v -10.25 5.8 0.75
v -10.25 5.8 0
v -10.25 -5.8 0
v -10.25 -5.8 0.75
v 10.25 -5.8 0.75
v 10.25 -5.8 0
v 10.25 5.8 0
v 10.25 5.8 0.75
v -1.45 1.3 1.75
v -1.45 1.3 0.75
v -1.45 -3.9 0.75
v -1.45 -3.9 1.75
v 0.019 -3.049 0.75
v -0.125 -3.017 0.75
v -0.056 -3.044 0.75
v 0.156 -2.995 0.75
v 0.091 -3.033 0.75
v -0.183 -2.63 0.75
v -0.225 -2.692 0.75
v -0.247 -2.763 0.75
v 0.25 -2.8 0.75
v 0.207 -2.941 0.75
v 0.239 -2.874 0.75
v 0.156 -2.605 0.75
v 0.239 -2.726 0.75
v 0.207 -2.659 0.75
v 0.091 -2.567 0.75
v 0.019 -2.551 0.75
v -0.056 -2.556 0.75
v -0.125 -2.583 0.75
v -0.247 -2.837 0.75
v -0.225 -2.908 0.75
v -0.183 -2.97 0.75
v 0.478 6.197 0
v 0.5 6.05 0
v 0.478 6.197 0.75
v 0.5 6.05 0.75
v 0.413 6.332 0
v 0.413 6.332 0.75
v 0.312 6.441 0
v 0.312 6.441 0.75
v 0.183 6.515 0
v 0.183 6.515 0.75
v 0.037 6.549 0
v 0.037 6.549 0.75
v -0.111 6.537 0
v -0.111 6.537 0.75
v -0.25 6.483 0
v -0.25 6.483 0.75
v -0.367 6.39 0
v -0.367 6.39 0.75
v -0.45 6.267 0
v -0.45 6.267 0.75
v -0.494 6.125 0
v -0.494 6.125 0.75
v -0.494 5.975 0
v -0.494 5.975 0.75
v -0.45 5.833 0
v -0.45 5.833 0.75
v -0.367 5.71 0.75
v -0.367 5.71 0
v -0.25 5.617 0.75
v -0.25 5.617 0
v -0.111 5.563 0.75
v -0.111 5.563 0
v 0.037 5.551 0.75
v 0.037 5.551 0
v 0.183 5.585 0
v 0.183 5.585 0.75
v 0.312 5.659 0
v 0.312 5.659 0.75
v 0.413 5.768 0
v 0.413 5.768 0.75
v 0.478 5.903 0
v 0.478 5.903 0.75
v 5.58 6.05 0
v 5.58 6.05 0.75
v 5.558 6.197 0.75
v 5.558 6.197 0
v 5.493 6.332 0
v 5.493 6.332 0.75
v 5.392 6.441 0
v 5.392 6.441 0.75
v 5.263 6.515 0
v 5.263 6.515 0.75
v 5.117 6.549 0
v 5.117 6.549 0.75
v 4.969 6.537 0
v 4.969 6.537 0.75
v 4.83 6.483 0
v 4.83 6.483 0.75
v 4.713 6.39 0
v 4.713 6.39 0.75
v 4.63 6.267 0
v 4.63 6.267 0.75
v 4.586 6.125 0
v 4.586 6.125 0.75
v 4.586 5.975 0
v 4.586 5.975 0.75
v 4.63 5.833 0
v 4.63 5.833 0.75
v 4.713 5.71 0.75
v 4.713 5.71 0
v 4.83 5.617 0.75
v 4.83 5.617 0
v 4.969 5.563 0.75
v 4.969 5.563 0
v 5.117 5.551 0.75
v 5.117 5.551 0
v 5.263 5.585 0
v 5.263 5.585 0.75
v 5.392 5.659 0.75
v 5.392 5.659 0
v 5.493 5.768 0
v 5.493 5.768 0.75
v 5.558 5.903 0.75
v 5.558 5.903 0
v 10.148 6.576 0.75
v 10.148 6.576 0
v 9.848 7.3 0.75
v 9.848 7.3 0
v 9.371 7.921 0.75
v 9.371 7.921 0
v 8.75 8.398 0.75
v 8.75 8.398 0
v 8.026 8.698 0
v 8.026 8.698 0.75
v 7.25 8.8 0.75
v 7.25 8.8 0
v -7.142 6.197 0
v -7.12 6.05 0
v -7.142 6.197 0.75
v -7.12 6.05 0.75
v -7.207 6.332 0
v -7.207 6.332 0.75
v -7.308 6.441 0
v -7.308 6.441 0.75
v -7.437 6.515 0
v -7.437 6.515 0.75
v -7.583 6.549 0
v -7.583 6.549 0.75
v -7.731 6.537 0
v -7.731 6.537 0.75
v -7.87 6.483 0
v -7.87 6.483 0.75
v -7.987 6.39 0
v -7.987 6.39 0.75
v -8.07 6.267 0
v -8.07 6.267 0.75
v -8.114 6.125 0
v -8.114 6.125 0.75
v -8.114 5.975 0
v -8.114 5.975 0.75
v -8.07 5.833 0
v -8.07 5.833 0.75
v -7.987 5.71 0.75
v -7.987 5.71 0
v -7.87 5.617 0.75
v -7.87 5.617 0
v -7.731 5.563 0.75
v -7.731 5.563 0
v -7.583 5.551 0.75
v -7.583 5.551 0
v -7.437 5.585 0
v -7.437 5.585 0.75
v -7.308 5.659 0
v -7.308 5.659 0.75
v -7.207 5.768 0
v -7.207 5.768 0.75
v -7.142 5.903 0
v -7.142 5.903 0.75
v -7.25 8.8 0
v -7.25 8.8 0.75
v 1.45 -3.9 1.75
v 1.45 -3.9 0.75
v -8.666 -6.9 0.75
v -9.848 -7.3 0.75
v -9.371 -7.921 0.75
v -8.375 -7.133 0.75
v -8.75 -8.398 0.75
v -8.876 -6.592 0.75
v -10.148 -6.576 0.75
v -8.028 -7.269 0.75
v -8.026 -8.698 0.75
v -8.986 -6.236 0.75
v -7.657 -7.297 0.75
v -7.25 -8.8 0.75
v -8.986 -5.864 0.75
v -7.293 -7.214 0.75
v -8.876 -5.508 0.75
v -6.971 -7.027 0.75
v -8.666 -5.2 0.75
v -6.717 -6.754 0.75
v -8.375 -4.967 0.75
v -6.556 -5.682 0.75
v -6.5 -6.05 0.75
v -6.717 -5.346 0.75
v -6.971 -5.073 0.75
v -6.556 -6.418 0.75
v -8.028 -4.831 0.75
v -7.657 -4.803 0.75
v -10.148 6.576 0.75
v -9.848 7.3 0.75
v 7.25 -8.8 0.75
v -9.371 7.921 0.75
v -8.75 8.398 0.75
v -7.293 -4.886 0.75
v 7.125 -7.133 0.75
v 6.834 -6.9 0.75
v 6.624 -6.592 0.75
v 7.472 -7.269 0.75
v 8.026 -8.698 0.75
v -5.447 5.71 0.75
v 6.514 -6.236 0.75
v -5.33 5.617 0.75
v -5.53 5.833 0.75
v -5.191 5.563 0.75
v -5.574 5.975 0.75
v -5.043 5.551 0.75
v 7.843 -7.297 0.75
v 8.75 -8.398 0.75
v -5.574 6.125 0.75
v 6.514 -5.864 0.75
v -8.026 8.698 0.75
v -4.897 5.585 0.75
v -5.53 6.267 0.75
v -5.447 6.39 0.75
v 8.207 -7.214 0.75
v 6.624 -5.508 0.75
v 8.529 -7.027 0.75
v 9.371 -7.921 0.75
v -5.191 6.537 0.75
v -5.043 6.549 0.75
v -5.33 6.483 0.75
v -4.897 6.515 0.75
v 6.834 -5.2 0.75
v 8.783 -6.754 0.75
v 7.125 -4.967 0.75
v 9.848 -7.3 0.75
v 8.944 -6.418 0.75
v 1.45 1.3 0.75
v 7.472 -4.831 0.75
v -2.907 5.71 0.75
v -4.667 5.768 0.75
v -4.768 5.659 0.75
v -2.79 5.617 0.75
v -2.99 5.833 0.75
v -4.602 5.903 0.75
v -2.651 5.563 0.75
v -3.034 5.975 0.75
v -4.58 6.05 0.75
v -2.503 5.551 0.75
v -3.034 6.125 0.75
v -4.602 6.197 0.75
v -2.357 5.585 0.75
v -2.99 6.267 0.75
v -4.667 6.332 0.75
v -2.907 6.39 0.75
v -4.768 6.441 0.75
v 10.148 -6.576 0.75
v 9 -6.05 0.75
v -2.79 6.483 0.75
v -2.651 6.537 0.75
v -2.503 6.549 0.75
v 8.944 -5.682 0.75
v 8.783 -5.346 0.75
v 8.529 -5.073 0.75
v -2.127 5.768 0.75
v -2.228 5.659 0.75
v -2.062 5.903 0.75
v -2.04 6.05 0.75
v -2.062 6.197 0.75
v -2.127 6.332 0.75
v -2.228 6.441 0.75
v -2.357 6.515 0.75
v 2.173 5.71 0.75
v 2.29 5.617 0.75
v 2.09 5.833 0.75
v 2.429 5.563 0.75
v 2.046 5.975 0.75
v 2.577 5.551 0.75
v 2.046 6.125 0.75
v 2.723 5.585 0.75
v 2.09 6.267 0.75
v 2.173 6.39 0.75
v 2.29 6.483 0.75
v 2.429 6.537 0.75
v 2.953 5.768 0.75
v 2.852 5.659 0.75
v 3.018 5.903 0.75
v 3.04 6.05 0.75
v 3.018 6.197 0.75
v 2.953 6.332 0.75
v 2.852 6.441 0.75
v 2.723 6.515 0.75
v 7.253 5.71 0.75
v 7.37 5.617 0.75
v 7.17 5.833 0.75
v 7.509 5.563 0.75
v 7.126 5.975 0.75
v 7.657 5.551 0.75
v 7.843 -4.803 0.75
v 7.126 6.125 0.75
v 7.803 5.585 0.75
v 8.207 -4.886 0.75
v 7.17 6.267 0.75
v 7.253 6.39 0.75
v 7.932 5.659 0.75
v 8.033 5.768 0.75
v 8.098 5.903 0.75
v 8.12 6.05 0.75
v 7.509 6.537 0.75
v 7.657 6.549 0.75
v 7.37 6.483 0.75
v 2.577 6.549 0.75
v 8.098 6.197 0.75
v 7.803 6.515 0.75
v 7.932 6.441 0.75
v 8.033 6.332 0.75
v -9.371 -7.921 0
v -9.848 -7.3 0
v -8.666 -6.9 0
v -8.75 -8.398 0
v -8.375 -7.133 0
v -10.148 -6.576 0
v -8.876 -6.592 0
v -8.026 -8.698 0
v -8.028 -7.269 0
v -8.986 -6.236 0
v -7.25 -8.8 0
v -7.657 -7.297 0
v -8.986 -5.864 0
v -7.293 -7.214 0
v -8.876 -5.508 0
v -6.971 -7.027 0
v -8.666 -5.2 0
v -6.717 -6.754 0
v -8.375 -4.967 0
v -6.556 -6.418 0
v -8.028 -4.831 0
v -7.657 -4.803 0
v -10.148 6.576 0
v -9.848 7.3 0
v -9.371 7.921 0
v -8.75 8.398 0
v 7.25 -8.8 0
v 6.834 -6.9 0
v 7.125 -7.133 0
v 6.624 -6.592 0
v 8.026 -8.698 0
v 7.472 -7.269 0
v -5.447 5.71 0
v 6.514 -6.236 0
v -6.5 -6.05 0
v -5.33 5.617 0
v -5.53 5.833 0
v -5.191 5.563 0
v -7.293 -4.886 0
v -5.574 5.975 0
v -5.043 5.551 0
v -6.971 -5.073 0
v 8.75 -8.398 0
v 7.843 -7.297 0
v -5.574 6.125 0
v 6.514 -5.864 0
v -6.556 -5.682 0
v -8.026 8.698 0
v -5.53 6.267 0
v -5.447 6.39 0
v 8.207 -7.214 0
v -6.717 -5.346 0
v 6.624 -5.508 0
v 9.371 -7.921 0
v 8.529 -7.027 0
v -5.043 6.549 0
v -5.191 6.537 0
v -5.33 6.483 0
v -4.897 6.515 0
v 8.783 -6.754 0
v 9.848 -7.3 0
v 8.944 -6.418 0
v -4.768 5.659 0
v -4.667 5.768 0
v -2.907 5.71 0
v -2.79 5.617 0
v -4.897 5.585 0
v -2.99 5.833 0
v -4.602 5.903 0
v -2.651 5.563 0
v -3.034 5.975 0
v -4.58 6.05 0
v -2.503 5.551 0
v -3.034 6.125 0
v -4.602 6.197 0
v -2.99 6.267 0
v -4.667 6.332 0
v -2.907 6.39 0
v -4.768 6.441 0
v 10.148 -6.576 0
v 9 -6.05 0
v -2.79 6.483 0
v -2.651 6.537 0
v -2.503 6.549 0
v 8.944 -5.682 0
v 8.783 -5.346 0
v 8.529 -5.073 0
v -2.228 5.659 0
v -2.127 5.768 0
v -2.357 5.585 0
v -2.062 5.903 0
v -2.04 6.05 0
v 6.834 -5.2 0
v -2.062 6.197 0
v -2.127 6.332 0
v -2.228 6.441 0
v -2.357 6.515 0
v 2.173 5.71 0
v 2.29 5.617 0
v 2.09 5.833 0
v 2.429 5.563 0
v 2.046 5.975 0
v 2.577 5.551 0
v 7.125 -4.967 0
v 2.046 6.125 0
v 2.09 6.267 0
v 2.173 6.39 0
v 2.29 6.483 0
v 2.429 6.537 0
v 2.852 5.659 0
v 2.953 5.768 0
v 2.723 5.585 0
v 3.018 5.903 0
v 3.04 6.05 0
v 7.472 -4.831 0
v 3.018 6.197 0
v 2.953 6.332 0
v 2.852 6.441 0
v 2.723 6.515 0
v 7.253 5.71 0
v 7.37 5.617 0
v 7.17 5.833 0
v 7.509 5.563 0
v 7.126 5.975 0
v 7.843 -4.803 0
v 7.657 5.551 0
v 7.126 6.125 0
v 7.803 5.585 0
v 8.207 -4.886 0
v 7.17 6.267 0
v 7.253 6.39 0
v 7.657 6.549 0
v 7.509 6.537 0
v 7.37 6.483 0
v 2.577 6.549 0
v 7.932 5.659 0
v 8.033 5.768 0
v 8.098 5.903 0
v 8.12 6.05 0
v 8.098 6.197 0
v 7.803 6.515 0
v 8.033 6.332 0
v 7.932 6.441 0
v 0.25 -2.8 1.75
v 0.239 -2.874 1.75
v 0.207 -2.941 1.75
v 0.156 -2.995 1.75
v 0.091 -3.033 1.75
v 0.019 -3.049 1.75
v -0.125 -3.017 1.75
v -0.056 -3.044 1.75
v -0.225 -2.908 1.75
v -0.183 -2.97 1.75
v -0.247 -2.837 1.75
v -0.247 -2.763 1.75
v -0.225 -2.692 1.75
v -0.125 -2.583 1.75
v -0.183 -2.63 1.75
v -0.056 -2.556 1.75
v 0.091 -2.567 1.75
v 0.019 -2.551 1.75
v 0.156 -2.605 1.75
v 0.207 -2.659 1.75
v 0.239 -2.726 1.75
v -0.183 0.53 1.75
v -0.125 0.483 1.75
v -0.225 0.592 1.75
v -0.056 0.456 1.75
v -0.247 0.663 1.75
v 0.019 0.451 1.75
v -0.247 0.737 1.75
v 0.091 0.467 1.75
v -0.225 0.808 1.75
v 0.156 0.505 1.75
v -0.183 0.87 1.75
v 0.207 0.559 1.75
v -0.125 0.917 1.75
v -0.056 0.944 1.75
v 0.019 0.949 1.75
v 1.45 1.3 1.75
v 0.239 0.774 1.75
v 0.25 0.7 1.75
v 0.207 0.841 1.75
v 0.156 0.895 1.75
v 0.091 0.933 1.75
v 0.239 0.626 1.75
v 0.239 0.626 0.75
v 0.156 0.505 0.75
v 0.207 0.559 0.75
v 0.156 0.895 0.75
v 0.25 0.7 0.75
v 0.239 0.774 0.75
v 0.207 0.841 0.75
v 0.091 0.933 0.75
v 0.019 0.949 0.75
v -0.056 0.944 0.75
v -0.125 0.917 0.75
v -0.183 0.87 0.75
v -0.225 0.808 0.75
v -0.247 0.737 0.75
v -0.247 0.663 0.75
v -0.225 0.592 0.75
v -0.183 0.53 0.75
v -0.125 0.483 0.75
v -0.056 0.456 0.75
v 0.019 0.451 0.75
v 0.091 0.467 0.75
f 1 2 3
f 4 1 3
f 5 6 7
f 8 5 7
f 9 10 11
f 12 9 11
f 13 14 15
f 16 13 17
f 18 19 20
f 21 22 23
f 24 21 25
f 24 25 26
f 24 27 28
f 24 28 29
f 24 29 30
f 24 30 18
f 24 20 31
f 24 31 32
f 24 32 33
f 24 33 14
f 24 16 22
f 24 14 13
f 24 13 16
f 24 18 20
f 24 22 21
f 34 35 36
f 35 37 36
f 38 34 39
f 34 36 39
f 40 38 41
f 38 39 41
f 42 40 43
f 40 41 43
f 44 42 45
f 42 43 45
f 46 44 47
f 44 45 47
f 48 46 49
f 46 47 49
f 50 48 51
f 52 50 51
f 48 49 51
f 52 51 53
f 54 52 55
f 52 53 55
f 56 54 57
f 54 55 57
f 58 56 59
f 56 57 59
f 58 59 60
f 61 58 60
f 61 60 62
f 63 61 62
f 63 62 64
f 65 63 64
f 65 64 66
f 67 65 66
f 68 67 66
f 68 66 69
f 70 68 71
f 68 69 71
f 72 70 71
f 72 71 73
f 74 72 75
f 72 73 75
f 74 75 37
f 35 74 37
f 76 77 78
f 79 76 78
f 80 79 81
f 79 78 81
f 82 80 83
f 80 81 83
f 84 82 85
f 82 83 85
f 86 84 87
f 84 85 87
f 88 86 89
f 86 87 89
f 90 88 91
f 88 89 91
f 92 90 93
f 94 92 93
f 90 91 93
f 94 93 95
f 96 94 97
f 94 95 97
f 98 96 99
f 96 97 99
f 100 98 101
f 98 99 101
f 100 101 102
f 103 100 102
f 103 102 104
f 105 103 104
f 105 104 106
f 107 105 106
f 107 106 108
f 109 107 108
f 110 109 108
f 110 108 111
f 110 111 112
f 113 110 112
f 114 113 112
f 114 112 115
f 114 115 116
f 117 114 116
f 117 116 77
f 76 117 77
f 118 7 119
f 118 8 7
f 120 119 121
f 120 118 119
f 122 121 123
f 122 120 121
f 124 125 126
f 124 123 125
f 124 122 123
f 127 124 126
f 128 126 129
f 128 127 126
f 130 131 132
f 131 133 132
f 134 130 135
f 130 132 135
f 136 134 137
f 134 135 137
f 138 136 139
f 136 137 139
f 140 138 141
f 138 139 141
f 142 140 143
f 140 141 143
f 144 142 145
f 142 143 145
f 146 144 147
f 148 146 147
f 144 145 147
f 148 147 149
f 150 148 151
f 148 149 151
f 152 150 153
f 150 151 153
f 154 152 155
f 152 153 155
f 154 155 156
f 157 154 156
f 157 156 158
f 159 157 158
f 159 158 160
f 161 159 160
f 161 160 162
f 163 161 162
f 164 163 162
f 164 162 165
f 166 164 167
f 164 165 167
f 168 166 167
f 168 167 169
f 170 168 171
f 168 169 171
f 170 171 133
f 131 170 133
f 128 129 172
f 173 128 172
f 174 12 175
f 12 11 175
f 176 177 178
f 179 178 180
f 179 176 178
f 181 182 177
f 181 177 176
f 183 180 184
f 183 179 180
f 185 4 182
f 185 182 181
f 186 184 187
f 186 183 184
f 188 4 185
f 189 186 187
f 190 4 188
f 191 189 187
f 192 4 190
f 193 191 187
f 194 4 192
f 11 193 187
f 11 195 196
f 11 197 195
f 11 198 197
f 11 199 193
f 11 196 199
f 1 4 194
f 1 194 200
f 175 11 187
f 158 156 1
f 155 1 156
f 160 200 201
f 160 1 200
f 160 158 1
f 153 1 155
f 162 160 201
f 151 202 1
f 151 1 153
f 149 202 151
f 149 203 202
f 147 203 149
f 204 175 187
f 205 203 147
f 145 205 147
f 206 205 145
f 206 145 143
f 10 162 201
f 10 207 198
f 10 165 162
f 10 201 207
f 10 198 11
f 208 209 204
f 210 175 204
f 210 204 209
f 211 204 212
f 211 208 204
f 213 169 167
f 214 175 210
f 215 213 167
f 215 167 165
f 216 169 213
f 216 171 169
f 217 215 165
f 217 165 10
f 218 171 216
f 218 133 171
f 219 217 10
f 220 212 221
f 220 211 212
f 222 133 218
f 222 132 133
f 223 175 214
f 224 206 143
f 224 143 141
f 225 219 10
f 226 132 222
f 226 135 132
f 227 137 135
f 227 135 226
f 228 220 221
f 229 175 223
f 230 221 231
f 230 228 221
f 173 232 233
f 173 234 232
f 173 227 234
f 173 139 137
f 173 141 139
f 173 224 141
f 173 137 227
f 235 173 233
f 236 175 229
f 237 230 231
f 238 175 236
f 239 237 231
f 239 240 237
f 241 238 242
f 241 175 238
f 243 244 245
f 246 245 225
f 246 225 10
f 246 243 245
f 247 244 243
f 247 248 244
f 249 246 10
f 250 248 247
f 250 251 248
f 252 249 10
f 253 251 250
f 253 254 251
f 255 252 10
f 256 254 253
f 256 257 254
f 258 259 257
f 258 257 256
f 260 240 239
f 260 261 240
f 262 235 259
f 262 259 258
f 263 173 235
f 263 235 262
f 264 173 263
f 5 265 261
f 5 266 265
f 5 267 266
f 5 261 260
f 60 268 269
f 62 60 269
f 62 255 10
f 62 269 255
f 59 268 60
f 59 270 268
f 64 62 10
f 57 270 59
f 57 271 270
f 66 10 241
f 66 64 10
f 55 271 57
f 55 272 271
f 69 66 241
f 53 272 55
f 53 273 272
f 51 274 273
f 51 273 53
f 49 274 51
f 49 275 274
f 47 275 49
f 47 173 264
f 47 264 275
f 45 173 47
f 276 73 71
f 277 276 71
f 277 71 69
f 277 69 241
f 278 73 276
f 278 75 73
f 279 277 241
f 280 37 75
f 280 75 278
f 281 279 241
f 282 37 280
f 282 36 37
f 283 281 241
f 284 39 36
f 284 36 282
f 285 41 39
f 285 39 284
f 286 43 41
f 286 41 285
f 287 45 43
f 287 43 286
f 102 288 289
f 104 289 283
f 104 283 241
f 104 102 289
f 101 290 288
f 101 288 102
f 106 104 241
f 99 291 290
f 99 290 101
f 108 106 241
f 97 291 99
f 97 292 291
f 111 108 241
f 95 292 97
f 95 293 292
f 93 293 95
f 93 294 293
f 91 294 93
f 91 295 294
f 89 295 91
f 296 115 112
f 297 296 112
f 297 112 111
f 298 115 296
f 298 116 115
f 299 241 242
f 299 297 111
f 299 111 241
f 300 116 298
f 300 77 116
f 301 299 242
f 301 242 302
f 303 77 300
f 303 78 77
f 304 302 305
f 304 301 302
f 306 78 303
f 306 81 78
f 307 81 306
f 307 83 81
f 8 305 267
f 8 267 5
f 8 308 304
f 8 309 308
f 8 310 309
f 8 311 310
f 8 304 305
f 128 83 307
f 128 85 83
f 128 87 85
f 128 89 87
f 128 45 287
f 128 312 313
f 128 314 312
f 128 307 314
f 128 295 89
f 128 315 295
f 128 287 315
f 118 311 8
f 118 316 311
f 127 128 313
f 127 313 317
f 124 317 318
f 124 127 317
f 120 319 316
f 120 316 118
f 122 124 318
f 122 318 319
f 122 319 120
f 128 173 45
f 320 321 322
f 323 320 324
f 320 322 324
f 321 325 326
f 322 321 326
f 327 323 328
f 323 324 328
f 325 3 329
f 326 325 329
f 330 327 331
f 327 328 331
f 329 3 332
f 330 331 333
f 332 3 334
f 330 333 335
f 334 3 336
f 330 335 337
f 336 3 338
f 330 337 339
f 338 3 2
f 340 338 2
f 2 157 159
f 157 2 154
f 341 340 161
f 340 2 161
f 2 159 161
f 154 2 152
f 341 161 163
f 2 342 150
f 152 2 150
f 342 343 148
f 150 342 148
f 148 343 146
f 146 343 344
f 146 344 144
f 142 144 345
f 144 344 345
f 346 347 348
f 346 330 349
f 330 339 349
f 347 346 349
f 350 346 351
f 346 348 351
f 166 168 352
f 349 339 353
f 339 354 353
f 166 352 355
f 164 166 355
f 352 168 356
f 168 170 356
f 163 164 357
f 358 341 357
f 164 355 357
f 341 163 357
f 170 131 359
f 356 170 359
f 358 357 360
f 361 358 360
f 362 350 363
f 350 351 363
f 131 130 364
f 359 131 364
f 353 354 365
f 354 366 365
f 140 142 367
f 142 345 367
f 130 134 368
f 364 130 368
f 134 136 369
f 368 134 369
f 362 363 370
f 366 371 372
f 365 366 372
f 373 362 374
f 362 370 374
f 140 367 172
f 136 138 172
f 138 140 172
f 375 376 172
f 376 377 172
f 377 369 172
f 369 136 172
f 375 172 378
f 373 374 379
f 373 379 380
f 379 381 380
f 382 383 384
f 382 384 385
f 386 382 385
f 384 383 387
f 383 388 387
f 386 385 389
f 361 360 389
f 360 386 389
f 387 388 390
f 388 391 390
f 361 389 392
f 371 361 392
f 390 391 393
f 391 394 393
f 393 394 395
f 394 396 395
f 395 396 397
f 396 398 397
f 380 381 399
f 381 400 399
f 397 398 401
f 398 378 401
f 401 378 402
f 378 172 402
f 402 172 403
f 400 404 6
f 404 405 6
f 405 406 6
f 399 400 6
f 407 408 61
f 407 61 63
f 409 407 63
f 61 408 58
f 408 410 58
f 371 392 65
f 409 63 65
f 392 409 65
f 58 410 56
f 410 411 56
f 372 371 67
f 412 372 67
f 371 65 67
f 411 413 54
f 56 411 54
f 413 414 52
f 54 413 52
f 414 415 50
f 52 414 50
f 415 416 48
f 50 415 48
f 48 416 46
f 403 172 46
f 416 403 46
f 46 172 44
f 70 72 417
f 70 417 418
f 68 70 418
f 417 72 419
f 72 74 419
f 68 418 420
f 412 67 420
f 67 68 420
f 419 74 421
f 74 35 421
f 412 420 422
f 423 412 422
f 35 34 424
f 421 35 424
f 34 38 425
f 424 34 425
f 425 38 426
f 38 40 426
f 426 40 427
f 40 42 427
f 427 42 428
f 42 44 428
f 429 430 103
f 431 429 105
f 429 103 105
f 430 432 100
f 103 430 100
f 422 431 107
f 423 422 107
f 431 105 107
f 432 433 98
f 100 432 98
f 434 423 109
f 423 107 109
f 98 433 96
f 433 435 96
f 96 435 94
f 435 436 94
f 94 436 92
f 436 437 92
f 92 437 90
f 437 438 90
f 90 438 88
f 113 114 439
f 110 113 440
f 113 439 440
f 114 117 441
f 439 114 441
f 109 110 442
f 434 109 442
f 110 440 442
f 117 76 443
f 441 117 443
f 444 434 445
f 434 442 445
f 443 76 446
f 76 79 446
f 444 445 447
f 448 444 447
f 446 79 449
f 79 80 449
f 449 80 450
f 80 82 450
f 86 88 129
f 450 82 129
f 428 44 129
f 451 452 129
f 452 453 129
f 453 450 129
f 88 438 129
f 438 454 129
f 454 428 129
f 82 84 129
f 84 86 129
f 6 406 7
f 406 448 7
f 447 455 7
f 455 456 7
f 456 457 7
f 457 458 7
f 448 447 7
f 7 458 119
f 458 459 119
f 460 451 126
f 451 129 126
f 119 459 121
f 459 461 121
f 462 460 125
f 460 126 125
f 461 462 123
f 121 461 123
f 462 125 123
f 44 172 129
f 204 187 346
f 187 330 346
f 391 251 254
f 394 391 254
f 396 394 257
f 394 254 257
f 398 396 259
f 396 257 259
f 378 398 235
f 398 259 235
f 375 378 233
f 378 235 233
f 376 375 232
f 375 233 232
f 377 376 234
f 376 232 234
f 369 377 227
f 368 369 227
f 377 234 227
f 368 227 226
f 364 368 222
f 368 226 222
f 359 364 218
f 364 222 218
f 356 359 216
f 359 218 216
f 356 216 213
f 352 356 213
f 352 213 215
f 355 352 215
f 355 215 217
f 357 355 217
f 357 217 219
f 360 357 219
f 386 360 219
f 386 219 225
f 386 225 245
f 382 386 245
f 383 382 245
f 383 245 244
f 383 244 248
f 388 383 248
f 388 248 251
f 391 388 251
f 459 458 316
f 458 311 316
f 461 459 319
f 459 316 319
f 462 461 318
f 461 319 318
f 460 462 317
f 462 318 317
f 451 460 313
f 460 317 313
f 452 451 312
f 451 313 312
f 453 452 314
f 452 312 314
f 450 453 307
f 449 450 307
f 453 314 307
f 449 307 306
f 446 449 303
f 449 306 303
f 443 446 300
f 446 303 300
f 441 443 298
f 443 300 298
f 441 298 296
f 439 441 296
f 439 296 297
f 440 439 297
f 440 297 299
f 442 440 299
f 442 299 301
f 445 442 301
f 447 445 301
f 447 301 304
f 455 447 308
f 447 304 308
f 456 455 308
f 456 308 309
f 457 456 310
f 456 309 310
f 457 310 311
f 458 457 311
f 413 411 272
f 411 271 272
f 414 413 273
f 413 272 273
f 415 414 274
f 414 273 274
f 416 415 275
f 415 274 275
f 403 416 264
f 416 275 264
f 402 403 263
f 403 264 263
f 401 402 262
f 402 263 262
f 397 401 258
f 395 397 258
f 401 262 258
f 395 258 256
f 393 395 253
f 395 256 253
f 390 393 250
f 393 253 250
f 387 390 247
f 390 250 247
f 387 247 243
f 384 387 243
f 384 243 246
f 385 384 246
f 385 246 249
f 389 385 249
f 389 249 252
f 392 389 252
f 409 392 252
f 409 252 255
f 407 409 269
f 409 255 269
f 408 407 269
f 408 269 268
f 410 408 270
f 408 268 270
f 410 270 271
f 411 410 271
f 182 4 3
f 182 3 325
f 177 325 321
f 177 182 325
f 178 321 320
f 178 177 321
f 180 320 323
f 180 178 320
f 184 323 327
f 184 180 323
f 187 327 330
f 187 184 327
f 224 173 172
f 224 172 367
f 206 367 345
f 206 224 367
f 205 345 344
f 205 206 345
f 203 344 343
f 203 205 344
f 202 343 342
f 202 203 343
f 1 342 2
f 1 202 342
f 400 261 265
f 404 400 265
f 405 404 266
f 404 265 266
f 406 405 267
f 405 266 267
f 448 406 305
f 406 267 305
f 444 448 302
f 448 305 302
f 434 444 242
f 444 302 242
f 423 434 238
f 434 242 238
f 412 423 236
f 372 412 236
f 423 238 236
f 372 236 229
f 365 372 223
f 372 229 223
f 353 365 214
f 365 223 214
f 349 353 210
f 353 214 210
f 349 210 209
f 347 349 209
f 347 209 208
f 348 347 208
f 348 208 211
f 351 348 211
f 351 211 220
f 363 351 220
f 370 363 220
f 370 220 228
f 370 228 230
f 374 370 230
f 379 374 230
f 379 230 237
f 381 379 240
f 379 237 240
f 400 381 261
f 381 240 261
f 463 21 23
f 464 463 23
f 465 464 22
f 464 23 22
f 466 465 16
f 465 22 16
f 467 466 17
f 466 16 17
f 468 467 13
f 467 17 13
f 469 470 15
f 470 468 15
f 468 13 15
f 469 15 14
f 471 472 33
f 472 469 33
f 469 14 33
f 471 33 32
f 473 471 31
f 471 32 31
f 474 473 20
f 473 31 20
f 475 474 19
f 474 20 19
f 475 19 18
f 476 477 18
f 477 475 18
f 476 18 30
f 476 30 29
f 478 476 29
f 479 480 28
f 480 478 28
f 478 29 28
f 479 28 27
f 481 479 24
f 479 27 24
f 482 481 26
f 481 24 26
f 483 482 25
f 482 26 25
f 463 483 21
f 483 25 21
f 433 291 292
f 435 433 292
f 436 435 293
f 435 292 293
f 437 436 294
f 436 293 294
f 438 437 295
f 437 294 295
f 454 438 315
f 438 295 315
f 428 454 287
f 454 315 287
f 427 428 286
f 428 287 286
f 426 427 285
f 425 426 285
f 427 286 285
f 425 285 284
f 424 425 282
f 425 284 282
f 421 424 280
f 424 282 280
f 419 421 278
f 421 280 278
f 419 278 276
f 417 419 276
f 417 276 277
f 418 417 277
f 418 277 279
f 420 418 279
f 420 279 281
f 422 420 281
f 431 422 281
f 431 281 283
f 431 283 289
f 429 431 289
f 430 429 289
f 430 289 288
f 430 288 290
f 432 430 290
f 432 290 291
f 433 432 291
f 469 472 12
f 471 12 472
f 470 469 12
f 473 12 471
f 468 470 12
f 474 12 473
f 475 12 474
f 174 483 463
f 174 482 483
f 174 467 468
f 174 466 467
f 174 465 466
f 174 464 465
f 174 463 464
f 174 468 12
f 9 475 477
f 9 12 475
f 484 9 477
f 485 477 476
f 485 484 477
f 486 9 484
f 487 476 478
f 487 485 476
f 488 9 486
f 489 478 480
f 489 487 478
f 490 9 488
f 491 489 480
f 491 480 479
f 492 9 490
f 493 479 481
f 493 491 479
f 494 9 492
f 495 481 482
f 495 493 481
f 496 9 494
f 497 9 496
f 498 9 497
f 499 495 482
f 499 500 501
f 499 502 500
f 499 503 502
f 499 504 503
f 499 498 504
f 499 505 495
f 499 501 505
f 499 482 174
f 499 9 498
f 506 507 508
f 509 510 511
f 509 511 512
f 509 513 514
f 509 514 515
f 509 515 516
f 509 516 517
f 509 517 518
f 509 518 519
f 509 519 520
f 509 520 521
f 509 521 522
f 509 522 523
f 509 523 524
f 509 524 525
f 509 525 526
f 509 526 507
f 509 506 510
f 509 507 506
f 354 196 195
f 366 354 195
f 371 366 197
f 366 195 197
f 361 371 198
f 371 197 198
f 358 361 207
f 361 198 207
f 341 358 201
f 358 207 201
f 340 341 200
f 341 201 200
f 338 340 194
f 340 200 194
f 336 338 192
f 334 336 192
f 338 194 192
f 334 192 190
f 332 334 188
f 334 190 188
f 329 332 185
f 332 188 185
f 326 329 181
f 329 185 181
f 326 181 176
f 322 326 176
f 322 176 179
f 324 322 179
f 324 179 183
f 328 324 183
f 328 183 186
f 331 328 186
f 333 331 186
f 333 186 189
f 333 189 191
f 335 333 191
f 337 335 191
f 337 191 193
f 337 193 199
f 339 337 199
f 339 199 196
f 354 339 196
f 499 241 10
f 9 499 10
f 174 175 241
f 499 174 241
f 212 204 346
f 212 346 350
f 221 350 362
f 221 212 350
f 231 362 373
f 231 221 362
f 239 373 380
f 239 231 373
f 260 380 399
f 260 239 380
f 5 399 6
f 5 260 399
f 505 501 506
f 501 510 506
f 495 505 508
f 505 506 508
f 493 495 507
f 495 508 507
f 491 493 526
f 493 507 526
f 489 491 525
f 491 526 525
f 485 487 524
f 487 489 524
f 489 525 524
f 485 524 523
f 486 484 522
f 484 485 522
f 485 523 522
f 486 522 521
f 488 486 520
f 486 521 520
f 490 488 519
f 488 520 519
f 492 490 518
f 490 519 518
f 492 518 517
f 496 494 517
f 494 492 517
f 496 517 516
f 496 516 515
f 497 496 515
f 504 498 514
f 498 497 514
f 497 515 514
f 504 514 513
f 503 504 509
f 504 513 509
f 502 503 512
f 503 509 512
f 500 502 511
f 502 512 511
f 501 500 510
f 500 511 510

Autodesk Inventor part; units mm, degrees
ref_plane "YZ Plane" through (0, 0, 0) normal (1, 0, 0) x (0, 1, 0)
ref_plane "XZ Plane" through (0, 0, 0) normal (0, 1, 0) x (-1, 0, 0)
ref_plane "XY Plane" through (0, 0, 0) normal (0, 0, 1) x (1, 0, 0)
sketch "Skizze1" plane through (0, 0, 0) normal (0, 0, 1) x (1, 0, 0)
  line L0 (-10.25, -8.8) -> (10.25, -8.8)
  line L1 (10.25, -8.8) -> (10.25, 8.8)
  line L2 (10.25, 8.8) -> (-10.25, 8.8)
  line L3 (-10.25, 8.8) -> (-10.25, -8.8)
  line L4 (-10.25, -8.8) -> (10.25, 8.8) construction
  line L5 (10.25, -8.8) -> (-10.25, 8.8) construction
  point P0 (0, 0)
  dimension "d0" = 20.5
  dimension "d1" = 17.6
extrude "Extrusion1" add sketch "Skizze1" along normal blind 0.75
fillet "Rundung1" radius 3 4 edges at (10.25, -8.8, 0.375) (-10.25, -8.8, 0.375) (-10.25, 8.8, 0.375) (10.25, 8.8, 0.375)
sketch "Skizze2" plane through (0, 0, 0.75) normal (0, 0, 1) x (1, 0, 0)
  line L0 (7.75, -6.05) -> (-7.75, -6.05) construction
  line L1 (-7.75, -6.05) -> (-7.75, 6.05) construction
  line L2 (-7.75, 6.05) -> (7.75, 6.05) construction
  line L3 (7.75, 6.05) -> (7.75, -6.05) construction
  line L4 (7.75, -6.05) -> (-7.75, 6.05) construction
  line L5 (-7.75, -6.05) -> (7.75, 6.05) construction
  circle A0 centre (-7.75, -6.05) radius 1.25
  circle A1 centre (7.75, -6.05) radius 1.25
  line L6 (-15.2198, 0) -> (15.2198, 0) construction
  circle A2 centre (0, 6.05) radius 0.5
  line L7 (-5.21, 6.05) -> (10.29, 6.05) construction
  circle A3 centre (2.54, 6.05) radius 0.5
  line L8 (-2.67, 6.05) -> (12.83, 6.05) construction
  circle A4 centre (5.08, 6.05) radius 0.5
  line L9 (-0.13, 6.05) -> (15.37, 6.05) construction
  circle A5 centre (7.62, 6.05) radius 0.5
  line L10 (-10.29, 6.05) -> (5.21, 6.05) construction
  circle A6 centre (-2.54, 6.05) radius 0.5
  line L11 (-7.75, 6.05) -> (7.75, 6.05) construction
  circle A7 centre (0, 6.05) radius 0.5
  line L12 (-5.21, 6.05) -> (10.29, 6.05) construction
  circle A8 centre (2.54, 6.05) radius 0.5
  line L13 (-2.67, 6.05) -> (12.83, 6.05) construction
  circle A9 centre (5.08, 6.05) radius 0.5
  line L14 (-12.83, 6.05) -> (2.67, 6.05) construction
  circle A10 centre (-5.08, 6.05) radius 0.5
  line L15 (-10.29, 6.05) -> (5.21, 6.05) construction
  circle A11 centre (-2.54, 6.05) radius 0.5
  line L16 (-7.75, 6.05) -> (7.75, 6.05) construction
  circle A12 centre (0, 6.05) radius 0.5
  line L17 (-5.21, 6.05) -> (10.29, 6.05) construction
  circle A13 centre (2.54, 6.05) radius 0.5
  line L18 (-15.37, 6.05) -> (0.13, 6.05) construction
  circle A14 centre (-7.62, 6.05) radius 0.5
  line L19 (-12.83, 6.05) -> (2.67, 6.05) construction
  circle A15 centre (-5.08, 6.05) radius 0.5
  line L20 (-10.29, 6.05) -> (5.21, 6.05) construction
  circle A16 centre (-2.54, 6.05) radius 0.5
  line L21 (-7.75, 6.05) -> (7.75, 6.05) construction
  circle A17 centre (0, 6.05) radius 0.5
  point P0 (0, 0)
  dimension "d5" = 15.5
  dimension "d6" = 12.1
  dimension "d7" = 2.5
  dimension "d10" = 1
  dimension "d13" = 2.54
  dimension "d16" = 2.54
extrude "Extrusion2" cut sketch "Skizze2" against normal through all
sketch "Skizze3" plane through (0, 0, 0.75) normal (0, 0, 1) x (1, 0, 0)
  line L0 (-1.45, -3.9) -> (1.45, -3.9)
  line L1 (1.45, -3.9) -> (1.45, 1.3)
  line L2 (1.45, 1.3) -> (-1.45, 1.3)
  line L3 (-1.45, 1.3) -> (-1.45, -3.9)
  line L4 (-1.45, -3.9) -> (1.45, 1.3) construction
  line L5 (1.45, -3.9) -> (-1.45, 1.3) construction
  line L6 (0, -13.1898) -> (0, 13.1898) construction
  circle A0 centre (0, -2.8) radius 0.25
  circle A1 centre (0, 0.7) radius 0.25
  line L7 (-15.2198, 0) -> (15.2198, 0) construction
  point P0 (0, 0)
  point P1 (0, -1.3)
  point P2 (0, -1.3)
  dimension "d21" = 2.9
  dimension "d22" = 5.2
  dimension "d23" = 0.5
  dimension "d24" = 0.5
  dimension "d25" = 0.6
  dimension "d26" = 1.1
  dimension "d27" = 1.3
extrude "Extrusion3" add sketch "Skizze3" along normal blind 1
properties part number "VL6180X-Time_of_Flight_Sensor"
